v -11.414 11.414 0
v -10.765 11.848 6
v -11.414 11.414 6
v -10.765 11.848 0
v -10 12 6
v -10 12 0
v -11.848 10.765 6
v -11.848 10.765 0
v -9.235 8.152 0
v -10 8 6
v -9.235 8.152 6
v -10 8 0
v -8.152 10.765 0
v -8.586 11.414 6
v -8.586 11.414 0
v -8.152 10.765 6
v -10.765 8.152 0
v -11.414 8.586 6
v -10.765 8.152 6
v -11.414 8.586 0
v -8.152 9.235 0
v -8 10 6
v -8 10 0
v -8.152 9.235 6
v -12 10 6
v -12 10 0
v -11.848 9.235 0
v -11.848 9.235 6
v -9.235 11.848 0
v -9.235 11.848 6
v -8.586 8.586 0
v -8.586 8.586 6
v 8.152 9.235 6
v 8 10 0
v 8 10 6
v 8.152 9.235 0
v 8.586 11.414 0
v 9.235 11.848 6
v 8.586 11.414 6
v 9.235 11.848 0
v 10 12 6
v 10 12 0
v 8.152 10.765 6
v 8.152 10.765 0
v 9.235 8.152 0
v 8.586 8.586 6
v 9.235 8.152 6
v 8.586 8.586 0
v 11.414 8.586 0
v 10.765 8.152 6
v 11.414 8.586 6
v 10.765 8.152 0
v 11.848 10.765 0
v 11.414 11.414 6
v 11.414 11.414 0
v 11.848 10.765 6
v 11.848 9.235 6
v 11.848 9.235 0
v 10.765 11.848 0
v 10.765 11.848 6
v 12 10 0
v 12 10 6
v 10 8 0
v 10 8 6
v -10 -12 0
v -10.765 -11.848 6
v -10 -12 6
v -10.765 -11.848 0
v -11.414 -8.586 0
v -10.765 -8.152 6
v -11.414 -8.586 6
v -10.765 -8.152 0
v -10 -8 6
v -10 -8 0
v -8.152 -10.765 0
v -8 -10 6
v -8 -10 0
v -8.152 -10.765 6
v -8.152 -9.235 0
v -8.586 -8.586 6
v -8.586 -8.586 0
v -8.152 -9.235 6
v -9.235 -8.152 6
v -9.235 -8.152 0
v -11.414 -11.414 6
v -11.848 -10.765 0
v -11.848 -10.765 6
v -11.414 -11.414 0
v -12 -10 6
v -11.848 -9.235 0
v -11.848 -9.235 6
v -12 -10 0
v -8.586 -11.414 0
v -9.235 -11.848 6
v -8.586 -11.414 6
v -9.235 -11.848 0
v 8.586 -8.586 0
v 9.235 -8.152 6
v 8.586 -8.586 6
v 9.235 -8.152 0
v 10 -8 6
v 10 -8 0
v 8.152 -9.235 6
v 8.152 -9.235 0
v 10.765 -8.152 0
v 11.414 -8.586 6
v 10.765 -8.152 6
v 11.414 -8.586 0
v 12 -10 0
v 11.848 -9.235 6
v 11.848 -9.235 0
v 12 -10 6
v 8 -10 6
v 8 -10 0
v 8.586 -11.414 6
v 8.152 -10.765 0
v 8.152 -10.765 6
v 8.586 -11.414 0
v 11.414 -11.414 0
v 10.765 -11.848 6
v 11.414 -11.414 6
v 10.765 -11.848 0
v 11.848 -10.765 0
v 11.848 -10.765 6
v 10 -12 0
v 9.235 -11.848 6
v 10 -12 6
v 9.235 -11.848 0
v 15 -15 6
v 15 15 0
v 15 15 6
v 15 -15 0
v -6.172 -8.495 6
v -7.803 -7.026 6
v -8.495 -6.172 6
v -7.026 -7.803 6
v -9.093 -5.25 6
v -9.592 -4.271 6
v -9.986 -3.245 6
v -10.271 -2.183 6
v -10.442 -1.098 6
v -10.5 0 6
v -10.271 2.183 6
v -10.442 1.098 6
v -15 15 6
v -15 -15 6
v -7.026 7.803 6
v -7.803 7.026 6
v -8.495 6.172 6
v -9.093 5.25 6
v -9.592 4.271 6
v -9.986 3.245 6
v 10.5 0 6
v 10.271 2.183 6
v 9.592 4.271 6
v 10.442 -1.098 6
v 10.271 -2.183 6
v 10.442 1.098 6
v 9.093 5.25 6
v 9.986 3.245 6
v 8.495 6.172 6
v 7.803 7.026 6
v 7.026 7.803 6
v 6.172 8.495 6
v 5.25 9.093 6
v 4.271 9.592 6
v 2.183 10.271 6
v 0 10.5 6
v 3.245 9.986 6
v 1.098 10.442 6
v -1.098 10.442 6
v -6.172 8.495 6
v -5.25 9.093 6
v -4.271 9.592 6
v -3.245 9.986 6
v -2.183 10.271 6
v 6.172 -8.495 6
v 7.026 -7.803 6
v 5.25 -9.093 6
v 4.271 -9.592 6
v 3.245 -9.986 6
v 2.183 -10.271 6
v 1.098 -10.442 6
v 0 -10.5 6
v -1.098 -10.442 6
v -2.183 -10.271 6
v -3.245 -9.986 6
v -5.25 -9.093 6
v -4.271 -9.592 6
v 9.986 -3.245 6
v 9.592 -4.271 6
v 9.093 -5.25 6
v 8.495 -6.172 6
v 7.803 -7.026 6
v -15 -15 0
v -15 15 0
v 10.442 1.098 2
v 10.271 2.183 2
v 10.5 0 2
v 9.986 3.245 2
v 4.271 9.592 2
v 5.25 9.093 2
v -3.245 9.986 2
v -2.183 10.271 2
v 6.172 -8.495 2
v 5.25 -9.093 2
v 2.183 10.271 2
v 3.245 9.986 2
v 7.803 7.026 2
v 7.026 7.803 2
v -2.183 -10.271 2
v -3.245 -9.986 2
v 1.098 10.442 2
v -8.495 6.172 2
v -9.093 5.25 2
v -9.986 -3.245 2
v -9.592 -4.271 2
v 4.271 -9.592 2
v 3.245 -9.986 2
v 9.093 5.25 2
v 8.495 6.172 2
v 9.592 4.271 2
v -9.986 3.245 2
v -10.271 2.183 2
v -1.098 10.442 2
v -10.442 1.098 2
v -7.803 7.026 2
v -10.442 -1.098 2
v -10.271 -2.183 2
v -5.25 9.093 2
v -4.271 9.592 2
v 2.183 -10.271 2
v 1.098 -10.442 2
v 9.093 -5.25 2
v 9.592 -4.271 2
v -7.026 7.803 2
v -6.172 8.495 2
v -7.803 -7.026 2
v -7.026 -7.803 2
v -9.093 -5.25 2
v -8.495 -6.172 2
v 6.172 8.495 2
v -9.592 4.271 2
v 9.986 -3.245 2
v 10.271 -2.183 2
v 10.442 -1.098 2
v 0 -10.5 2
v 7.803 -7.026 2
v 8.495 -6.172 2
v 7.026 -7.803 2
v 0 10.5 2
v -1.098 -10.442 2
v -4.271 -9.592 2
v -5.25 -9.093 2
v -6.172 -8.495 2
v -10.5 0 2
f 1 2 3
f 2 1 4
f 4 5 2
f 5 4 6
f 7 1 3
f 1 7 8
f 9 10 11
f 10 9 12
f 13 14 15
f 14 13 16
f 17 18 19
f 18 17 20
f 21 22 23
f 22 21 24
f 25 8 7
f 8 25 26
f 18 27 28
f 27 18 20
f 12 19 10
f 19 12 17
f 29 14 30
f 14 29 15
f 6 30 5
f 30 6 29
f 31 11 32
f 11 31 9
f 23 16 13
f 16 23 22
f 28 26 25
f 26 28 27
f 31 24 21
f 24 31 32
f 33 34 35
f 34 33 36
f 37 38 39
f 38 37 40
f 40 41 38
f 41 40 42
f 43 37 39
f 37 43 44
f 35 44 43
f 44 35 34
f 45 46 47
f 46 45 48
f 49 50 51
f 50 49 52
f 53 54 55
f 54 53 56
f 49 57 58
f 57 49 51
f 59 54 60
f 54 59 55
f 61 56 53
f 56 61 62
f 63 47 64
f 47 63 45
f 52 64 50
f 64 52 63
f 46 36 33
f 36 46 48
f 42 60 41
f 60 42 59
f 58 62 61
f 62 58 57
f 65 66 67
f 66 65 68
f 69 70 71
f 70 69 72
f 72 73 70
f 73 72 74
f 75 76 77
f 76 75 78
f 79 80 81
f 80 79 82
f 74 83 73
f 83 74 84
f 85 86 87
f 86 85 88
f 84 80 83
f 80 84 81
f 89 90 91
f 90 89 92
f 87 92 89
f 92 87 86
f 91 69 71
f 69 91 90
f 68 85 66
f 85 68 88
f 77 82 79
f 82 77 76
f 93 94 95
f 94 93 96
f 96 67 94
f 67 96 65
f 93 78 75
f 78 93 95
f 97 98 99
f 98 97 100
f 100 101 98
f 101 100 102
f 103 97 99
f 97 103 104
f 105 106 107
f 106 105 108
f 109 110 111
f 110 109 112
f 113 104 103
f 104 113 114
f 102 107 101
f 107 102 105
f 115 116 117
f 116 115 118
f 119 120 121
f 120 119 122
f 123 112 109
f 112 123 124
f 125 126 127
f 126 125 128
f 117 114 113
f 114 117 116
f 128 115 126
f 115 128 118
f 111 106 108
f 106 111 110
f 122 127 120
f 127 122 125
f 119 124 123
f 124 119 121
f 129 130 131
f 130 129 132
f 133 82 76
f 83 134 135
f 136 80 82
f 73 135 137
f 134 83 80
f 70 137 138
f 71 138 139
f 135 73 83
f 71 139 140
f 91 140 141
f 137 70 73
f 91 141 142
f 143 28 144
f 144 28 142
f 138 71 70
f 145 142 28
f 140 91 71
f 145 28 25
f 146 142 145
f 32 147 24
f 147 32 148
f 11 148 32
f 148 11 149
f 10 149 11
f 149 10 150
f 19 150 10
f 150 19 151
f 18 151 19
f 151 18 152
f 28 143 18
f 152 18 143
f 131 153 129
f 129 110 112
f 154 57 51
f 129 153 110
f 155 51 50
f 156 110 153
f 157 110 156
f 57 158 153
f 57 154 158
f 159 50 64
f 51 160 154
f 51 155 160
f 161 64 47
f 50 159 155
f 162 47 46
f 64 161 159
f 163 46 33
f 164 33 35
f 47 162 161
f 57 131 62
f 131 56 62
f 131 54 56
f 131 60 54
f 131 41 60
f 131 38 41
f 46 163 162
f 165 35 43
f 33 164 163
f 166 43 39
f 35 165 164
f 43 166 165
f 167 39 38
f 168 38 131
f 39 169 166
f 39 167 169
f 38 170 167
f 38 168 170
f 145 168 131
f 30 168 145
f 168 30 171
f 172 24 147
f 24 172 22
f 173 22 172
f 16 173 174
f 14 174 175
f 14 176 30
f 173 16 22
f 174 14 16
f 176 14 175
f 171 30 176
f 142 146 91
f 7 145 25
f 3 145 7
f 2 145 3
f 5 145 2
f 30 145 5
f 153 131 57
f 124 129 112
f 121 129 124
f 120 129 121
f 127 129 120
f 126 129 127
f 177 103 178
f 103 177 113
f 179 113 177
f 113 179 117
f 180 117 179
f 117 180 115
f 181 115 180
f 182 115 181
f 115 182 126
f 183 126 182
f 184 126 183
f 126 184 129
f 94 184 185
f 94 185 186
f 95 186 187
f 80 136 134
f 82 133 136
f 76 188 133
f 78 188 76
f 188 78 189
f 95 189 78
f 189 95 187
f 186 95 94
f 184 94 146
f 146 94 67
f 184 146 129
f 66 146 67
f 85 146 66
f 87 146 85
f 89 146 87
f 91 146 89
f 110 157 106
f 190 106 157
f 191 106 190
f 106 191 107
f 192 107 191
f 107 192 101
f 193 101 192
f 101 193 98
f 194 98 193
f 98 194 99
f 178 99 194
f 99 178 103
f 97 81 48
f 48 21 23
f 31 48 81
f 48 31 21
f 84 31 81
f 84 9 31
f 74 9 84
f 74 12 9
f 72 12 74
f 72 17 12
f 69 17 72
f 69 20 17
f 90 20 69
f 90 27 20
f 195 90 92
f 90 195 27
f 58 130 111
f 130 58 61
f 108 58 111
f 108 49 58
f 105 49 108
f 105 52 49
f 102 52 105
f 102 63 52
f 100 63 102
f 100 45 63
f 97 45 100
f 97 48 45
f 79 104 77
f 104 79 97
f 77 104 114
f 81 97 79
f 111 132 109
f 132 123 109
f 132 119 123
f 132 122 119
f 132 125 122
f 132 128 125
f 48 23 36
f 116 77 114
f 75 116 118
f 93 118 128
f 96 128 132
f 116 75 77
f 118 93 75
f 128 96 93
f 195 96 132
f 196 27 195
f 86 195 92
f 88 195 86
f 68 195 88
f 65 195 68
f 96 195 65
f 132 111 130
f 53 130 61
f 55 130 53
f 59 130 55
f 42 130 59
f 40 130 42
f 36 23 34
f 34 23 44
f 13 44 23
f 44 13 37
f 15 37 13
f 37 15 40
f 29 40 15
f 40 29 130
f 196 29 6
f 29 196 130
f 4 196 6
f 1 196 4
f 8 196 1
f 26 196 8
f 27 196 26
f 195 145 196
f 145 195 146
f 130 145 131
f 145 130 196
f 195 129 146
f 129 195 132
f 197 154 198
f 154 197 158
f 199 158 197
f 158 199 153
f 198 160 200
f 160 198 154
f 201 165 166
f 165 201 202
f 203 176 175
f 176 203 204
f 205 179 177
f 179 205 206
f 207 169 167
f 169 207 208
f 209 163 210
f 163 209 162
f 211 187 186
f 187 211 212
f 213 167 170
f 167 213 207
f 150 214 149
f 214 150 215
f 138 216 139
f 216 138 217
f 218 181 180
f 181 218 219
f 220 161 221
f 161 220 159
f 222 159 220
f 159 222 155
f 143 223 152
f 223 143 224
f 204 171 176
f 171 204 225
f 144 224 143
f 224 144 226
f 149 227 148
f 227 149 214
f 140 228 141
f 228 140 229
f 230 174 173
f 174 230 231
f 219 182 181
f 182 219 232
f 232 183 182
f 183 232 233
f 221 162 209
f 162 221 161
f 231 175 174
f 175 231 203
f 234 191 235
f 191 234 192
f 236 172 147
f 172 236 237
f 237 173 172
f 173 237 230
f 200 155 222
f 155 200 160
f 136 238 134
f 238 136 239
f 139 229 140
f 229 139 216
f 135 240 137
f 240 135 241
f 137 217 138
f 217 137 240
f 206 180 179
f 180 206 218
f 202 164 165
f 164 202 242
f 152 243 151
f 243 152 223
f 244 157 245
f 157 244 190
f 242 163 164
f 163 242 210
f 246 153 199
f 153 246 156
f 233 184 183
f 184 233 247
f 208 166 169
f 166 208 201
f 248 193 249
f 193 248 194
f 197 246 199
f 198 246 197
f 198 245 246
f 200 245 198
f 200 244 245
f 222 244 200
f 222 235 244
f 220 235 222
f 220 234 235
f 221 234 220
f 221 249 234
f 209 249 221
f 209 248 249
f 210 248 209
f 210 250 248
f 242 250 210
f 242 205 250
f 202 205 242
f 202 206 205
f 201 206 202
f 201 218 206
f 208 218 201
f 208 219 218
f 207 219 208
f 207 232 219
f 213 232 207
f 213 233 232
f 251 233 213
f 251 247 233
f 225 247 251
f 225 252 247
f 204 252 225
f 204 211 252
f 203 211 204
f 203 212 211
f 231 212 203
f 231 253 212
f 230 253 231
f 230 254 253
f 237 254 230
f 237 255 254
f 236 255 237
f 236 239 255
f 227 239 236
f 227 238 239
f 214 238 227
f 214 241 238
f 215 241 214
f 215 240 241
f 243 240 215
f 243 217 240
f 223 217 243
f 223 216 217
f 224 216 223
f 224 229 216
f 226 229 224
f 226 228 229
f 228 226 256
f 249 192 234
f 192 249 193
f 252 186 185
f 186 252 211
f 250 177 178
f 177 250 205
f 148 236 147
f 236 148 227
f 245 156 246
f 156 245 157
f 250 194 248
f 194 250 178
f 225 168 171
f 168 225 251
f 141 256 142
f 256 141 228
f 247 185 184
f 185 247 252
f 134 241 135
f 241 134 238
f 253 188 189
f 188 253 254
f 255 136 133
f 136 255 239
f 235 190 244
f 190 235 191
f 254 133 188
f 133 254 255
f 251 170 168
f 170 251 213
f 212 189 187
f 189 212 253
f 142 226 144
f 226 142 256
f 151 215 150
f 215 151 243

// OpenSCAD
// mirror 1 mount
xy = [1,-1];
thick = 6;
$fa = 6;
$fs = 0.8;
holeDepth = 4;

difference(){
    translate([0,0,thick/2])
cube([30,30,thick], center = true);
    translate([0,0,thick+1])
    cylinder(2*holeDepth+2,d = 21, center = true);
    for (a=[0:1]){
     for (b=[0:1]){
        translate([0,0,4])
         rotate(90)
         translate([xy[a]*10,xy[b]*10,0])
         cylinder(10,d=4, center = true);
    }   
    }
}
